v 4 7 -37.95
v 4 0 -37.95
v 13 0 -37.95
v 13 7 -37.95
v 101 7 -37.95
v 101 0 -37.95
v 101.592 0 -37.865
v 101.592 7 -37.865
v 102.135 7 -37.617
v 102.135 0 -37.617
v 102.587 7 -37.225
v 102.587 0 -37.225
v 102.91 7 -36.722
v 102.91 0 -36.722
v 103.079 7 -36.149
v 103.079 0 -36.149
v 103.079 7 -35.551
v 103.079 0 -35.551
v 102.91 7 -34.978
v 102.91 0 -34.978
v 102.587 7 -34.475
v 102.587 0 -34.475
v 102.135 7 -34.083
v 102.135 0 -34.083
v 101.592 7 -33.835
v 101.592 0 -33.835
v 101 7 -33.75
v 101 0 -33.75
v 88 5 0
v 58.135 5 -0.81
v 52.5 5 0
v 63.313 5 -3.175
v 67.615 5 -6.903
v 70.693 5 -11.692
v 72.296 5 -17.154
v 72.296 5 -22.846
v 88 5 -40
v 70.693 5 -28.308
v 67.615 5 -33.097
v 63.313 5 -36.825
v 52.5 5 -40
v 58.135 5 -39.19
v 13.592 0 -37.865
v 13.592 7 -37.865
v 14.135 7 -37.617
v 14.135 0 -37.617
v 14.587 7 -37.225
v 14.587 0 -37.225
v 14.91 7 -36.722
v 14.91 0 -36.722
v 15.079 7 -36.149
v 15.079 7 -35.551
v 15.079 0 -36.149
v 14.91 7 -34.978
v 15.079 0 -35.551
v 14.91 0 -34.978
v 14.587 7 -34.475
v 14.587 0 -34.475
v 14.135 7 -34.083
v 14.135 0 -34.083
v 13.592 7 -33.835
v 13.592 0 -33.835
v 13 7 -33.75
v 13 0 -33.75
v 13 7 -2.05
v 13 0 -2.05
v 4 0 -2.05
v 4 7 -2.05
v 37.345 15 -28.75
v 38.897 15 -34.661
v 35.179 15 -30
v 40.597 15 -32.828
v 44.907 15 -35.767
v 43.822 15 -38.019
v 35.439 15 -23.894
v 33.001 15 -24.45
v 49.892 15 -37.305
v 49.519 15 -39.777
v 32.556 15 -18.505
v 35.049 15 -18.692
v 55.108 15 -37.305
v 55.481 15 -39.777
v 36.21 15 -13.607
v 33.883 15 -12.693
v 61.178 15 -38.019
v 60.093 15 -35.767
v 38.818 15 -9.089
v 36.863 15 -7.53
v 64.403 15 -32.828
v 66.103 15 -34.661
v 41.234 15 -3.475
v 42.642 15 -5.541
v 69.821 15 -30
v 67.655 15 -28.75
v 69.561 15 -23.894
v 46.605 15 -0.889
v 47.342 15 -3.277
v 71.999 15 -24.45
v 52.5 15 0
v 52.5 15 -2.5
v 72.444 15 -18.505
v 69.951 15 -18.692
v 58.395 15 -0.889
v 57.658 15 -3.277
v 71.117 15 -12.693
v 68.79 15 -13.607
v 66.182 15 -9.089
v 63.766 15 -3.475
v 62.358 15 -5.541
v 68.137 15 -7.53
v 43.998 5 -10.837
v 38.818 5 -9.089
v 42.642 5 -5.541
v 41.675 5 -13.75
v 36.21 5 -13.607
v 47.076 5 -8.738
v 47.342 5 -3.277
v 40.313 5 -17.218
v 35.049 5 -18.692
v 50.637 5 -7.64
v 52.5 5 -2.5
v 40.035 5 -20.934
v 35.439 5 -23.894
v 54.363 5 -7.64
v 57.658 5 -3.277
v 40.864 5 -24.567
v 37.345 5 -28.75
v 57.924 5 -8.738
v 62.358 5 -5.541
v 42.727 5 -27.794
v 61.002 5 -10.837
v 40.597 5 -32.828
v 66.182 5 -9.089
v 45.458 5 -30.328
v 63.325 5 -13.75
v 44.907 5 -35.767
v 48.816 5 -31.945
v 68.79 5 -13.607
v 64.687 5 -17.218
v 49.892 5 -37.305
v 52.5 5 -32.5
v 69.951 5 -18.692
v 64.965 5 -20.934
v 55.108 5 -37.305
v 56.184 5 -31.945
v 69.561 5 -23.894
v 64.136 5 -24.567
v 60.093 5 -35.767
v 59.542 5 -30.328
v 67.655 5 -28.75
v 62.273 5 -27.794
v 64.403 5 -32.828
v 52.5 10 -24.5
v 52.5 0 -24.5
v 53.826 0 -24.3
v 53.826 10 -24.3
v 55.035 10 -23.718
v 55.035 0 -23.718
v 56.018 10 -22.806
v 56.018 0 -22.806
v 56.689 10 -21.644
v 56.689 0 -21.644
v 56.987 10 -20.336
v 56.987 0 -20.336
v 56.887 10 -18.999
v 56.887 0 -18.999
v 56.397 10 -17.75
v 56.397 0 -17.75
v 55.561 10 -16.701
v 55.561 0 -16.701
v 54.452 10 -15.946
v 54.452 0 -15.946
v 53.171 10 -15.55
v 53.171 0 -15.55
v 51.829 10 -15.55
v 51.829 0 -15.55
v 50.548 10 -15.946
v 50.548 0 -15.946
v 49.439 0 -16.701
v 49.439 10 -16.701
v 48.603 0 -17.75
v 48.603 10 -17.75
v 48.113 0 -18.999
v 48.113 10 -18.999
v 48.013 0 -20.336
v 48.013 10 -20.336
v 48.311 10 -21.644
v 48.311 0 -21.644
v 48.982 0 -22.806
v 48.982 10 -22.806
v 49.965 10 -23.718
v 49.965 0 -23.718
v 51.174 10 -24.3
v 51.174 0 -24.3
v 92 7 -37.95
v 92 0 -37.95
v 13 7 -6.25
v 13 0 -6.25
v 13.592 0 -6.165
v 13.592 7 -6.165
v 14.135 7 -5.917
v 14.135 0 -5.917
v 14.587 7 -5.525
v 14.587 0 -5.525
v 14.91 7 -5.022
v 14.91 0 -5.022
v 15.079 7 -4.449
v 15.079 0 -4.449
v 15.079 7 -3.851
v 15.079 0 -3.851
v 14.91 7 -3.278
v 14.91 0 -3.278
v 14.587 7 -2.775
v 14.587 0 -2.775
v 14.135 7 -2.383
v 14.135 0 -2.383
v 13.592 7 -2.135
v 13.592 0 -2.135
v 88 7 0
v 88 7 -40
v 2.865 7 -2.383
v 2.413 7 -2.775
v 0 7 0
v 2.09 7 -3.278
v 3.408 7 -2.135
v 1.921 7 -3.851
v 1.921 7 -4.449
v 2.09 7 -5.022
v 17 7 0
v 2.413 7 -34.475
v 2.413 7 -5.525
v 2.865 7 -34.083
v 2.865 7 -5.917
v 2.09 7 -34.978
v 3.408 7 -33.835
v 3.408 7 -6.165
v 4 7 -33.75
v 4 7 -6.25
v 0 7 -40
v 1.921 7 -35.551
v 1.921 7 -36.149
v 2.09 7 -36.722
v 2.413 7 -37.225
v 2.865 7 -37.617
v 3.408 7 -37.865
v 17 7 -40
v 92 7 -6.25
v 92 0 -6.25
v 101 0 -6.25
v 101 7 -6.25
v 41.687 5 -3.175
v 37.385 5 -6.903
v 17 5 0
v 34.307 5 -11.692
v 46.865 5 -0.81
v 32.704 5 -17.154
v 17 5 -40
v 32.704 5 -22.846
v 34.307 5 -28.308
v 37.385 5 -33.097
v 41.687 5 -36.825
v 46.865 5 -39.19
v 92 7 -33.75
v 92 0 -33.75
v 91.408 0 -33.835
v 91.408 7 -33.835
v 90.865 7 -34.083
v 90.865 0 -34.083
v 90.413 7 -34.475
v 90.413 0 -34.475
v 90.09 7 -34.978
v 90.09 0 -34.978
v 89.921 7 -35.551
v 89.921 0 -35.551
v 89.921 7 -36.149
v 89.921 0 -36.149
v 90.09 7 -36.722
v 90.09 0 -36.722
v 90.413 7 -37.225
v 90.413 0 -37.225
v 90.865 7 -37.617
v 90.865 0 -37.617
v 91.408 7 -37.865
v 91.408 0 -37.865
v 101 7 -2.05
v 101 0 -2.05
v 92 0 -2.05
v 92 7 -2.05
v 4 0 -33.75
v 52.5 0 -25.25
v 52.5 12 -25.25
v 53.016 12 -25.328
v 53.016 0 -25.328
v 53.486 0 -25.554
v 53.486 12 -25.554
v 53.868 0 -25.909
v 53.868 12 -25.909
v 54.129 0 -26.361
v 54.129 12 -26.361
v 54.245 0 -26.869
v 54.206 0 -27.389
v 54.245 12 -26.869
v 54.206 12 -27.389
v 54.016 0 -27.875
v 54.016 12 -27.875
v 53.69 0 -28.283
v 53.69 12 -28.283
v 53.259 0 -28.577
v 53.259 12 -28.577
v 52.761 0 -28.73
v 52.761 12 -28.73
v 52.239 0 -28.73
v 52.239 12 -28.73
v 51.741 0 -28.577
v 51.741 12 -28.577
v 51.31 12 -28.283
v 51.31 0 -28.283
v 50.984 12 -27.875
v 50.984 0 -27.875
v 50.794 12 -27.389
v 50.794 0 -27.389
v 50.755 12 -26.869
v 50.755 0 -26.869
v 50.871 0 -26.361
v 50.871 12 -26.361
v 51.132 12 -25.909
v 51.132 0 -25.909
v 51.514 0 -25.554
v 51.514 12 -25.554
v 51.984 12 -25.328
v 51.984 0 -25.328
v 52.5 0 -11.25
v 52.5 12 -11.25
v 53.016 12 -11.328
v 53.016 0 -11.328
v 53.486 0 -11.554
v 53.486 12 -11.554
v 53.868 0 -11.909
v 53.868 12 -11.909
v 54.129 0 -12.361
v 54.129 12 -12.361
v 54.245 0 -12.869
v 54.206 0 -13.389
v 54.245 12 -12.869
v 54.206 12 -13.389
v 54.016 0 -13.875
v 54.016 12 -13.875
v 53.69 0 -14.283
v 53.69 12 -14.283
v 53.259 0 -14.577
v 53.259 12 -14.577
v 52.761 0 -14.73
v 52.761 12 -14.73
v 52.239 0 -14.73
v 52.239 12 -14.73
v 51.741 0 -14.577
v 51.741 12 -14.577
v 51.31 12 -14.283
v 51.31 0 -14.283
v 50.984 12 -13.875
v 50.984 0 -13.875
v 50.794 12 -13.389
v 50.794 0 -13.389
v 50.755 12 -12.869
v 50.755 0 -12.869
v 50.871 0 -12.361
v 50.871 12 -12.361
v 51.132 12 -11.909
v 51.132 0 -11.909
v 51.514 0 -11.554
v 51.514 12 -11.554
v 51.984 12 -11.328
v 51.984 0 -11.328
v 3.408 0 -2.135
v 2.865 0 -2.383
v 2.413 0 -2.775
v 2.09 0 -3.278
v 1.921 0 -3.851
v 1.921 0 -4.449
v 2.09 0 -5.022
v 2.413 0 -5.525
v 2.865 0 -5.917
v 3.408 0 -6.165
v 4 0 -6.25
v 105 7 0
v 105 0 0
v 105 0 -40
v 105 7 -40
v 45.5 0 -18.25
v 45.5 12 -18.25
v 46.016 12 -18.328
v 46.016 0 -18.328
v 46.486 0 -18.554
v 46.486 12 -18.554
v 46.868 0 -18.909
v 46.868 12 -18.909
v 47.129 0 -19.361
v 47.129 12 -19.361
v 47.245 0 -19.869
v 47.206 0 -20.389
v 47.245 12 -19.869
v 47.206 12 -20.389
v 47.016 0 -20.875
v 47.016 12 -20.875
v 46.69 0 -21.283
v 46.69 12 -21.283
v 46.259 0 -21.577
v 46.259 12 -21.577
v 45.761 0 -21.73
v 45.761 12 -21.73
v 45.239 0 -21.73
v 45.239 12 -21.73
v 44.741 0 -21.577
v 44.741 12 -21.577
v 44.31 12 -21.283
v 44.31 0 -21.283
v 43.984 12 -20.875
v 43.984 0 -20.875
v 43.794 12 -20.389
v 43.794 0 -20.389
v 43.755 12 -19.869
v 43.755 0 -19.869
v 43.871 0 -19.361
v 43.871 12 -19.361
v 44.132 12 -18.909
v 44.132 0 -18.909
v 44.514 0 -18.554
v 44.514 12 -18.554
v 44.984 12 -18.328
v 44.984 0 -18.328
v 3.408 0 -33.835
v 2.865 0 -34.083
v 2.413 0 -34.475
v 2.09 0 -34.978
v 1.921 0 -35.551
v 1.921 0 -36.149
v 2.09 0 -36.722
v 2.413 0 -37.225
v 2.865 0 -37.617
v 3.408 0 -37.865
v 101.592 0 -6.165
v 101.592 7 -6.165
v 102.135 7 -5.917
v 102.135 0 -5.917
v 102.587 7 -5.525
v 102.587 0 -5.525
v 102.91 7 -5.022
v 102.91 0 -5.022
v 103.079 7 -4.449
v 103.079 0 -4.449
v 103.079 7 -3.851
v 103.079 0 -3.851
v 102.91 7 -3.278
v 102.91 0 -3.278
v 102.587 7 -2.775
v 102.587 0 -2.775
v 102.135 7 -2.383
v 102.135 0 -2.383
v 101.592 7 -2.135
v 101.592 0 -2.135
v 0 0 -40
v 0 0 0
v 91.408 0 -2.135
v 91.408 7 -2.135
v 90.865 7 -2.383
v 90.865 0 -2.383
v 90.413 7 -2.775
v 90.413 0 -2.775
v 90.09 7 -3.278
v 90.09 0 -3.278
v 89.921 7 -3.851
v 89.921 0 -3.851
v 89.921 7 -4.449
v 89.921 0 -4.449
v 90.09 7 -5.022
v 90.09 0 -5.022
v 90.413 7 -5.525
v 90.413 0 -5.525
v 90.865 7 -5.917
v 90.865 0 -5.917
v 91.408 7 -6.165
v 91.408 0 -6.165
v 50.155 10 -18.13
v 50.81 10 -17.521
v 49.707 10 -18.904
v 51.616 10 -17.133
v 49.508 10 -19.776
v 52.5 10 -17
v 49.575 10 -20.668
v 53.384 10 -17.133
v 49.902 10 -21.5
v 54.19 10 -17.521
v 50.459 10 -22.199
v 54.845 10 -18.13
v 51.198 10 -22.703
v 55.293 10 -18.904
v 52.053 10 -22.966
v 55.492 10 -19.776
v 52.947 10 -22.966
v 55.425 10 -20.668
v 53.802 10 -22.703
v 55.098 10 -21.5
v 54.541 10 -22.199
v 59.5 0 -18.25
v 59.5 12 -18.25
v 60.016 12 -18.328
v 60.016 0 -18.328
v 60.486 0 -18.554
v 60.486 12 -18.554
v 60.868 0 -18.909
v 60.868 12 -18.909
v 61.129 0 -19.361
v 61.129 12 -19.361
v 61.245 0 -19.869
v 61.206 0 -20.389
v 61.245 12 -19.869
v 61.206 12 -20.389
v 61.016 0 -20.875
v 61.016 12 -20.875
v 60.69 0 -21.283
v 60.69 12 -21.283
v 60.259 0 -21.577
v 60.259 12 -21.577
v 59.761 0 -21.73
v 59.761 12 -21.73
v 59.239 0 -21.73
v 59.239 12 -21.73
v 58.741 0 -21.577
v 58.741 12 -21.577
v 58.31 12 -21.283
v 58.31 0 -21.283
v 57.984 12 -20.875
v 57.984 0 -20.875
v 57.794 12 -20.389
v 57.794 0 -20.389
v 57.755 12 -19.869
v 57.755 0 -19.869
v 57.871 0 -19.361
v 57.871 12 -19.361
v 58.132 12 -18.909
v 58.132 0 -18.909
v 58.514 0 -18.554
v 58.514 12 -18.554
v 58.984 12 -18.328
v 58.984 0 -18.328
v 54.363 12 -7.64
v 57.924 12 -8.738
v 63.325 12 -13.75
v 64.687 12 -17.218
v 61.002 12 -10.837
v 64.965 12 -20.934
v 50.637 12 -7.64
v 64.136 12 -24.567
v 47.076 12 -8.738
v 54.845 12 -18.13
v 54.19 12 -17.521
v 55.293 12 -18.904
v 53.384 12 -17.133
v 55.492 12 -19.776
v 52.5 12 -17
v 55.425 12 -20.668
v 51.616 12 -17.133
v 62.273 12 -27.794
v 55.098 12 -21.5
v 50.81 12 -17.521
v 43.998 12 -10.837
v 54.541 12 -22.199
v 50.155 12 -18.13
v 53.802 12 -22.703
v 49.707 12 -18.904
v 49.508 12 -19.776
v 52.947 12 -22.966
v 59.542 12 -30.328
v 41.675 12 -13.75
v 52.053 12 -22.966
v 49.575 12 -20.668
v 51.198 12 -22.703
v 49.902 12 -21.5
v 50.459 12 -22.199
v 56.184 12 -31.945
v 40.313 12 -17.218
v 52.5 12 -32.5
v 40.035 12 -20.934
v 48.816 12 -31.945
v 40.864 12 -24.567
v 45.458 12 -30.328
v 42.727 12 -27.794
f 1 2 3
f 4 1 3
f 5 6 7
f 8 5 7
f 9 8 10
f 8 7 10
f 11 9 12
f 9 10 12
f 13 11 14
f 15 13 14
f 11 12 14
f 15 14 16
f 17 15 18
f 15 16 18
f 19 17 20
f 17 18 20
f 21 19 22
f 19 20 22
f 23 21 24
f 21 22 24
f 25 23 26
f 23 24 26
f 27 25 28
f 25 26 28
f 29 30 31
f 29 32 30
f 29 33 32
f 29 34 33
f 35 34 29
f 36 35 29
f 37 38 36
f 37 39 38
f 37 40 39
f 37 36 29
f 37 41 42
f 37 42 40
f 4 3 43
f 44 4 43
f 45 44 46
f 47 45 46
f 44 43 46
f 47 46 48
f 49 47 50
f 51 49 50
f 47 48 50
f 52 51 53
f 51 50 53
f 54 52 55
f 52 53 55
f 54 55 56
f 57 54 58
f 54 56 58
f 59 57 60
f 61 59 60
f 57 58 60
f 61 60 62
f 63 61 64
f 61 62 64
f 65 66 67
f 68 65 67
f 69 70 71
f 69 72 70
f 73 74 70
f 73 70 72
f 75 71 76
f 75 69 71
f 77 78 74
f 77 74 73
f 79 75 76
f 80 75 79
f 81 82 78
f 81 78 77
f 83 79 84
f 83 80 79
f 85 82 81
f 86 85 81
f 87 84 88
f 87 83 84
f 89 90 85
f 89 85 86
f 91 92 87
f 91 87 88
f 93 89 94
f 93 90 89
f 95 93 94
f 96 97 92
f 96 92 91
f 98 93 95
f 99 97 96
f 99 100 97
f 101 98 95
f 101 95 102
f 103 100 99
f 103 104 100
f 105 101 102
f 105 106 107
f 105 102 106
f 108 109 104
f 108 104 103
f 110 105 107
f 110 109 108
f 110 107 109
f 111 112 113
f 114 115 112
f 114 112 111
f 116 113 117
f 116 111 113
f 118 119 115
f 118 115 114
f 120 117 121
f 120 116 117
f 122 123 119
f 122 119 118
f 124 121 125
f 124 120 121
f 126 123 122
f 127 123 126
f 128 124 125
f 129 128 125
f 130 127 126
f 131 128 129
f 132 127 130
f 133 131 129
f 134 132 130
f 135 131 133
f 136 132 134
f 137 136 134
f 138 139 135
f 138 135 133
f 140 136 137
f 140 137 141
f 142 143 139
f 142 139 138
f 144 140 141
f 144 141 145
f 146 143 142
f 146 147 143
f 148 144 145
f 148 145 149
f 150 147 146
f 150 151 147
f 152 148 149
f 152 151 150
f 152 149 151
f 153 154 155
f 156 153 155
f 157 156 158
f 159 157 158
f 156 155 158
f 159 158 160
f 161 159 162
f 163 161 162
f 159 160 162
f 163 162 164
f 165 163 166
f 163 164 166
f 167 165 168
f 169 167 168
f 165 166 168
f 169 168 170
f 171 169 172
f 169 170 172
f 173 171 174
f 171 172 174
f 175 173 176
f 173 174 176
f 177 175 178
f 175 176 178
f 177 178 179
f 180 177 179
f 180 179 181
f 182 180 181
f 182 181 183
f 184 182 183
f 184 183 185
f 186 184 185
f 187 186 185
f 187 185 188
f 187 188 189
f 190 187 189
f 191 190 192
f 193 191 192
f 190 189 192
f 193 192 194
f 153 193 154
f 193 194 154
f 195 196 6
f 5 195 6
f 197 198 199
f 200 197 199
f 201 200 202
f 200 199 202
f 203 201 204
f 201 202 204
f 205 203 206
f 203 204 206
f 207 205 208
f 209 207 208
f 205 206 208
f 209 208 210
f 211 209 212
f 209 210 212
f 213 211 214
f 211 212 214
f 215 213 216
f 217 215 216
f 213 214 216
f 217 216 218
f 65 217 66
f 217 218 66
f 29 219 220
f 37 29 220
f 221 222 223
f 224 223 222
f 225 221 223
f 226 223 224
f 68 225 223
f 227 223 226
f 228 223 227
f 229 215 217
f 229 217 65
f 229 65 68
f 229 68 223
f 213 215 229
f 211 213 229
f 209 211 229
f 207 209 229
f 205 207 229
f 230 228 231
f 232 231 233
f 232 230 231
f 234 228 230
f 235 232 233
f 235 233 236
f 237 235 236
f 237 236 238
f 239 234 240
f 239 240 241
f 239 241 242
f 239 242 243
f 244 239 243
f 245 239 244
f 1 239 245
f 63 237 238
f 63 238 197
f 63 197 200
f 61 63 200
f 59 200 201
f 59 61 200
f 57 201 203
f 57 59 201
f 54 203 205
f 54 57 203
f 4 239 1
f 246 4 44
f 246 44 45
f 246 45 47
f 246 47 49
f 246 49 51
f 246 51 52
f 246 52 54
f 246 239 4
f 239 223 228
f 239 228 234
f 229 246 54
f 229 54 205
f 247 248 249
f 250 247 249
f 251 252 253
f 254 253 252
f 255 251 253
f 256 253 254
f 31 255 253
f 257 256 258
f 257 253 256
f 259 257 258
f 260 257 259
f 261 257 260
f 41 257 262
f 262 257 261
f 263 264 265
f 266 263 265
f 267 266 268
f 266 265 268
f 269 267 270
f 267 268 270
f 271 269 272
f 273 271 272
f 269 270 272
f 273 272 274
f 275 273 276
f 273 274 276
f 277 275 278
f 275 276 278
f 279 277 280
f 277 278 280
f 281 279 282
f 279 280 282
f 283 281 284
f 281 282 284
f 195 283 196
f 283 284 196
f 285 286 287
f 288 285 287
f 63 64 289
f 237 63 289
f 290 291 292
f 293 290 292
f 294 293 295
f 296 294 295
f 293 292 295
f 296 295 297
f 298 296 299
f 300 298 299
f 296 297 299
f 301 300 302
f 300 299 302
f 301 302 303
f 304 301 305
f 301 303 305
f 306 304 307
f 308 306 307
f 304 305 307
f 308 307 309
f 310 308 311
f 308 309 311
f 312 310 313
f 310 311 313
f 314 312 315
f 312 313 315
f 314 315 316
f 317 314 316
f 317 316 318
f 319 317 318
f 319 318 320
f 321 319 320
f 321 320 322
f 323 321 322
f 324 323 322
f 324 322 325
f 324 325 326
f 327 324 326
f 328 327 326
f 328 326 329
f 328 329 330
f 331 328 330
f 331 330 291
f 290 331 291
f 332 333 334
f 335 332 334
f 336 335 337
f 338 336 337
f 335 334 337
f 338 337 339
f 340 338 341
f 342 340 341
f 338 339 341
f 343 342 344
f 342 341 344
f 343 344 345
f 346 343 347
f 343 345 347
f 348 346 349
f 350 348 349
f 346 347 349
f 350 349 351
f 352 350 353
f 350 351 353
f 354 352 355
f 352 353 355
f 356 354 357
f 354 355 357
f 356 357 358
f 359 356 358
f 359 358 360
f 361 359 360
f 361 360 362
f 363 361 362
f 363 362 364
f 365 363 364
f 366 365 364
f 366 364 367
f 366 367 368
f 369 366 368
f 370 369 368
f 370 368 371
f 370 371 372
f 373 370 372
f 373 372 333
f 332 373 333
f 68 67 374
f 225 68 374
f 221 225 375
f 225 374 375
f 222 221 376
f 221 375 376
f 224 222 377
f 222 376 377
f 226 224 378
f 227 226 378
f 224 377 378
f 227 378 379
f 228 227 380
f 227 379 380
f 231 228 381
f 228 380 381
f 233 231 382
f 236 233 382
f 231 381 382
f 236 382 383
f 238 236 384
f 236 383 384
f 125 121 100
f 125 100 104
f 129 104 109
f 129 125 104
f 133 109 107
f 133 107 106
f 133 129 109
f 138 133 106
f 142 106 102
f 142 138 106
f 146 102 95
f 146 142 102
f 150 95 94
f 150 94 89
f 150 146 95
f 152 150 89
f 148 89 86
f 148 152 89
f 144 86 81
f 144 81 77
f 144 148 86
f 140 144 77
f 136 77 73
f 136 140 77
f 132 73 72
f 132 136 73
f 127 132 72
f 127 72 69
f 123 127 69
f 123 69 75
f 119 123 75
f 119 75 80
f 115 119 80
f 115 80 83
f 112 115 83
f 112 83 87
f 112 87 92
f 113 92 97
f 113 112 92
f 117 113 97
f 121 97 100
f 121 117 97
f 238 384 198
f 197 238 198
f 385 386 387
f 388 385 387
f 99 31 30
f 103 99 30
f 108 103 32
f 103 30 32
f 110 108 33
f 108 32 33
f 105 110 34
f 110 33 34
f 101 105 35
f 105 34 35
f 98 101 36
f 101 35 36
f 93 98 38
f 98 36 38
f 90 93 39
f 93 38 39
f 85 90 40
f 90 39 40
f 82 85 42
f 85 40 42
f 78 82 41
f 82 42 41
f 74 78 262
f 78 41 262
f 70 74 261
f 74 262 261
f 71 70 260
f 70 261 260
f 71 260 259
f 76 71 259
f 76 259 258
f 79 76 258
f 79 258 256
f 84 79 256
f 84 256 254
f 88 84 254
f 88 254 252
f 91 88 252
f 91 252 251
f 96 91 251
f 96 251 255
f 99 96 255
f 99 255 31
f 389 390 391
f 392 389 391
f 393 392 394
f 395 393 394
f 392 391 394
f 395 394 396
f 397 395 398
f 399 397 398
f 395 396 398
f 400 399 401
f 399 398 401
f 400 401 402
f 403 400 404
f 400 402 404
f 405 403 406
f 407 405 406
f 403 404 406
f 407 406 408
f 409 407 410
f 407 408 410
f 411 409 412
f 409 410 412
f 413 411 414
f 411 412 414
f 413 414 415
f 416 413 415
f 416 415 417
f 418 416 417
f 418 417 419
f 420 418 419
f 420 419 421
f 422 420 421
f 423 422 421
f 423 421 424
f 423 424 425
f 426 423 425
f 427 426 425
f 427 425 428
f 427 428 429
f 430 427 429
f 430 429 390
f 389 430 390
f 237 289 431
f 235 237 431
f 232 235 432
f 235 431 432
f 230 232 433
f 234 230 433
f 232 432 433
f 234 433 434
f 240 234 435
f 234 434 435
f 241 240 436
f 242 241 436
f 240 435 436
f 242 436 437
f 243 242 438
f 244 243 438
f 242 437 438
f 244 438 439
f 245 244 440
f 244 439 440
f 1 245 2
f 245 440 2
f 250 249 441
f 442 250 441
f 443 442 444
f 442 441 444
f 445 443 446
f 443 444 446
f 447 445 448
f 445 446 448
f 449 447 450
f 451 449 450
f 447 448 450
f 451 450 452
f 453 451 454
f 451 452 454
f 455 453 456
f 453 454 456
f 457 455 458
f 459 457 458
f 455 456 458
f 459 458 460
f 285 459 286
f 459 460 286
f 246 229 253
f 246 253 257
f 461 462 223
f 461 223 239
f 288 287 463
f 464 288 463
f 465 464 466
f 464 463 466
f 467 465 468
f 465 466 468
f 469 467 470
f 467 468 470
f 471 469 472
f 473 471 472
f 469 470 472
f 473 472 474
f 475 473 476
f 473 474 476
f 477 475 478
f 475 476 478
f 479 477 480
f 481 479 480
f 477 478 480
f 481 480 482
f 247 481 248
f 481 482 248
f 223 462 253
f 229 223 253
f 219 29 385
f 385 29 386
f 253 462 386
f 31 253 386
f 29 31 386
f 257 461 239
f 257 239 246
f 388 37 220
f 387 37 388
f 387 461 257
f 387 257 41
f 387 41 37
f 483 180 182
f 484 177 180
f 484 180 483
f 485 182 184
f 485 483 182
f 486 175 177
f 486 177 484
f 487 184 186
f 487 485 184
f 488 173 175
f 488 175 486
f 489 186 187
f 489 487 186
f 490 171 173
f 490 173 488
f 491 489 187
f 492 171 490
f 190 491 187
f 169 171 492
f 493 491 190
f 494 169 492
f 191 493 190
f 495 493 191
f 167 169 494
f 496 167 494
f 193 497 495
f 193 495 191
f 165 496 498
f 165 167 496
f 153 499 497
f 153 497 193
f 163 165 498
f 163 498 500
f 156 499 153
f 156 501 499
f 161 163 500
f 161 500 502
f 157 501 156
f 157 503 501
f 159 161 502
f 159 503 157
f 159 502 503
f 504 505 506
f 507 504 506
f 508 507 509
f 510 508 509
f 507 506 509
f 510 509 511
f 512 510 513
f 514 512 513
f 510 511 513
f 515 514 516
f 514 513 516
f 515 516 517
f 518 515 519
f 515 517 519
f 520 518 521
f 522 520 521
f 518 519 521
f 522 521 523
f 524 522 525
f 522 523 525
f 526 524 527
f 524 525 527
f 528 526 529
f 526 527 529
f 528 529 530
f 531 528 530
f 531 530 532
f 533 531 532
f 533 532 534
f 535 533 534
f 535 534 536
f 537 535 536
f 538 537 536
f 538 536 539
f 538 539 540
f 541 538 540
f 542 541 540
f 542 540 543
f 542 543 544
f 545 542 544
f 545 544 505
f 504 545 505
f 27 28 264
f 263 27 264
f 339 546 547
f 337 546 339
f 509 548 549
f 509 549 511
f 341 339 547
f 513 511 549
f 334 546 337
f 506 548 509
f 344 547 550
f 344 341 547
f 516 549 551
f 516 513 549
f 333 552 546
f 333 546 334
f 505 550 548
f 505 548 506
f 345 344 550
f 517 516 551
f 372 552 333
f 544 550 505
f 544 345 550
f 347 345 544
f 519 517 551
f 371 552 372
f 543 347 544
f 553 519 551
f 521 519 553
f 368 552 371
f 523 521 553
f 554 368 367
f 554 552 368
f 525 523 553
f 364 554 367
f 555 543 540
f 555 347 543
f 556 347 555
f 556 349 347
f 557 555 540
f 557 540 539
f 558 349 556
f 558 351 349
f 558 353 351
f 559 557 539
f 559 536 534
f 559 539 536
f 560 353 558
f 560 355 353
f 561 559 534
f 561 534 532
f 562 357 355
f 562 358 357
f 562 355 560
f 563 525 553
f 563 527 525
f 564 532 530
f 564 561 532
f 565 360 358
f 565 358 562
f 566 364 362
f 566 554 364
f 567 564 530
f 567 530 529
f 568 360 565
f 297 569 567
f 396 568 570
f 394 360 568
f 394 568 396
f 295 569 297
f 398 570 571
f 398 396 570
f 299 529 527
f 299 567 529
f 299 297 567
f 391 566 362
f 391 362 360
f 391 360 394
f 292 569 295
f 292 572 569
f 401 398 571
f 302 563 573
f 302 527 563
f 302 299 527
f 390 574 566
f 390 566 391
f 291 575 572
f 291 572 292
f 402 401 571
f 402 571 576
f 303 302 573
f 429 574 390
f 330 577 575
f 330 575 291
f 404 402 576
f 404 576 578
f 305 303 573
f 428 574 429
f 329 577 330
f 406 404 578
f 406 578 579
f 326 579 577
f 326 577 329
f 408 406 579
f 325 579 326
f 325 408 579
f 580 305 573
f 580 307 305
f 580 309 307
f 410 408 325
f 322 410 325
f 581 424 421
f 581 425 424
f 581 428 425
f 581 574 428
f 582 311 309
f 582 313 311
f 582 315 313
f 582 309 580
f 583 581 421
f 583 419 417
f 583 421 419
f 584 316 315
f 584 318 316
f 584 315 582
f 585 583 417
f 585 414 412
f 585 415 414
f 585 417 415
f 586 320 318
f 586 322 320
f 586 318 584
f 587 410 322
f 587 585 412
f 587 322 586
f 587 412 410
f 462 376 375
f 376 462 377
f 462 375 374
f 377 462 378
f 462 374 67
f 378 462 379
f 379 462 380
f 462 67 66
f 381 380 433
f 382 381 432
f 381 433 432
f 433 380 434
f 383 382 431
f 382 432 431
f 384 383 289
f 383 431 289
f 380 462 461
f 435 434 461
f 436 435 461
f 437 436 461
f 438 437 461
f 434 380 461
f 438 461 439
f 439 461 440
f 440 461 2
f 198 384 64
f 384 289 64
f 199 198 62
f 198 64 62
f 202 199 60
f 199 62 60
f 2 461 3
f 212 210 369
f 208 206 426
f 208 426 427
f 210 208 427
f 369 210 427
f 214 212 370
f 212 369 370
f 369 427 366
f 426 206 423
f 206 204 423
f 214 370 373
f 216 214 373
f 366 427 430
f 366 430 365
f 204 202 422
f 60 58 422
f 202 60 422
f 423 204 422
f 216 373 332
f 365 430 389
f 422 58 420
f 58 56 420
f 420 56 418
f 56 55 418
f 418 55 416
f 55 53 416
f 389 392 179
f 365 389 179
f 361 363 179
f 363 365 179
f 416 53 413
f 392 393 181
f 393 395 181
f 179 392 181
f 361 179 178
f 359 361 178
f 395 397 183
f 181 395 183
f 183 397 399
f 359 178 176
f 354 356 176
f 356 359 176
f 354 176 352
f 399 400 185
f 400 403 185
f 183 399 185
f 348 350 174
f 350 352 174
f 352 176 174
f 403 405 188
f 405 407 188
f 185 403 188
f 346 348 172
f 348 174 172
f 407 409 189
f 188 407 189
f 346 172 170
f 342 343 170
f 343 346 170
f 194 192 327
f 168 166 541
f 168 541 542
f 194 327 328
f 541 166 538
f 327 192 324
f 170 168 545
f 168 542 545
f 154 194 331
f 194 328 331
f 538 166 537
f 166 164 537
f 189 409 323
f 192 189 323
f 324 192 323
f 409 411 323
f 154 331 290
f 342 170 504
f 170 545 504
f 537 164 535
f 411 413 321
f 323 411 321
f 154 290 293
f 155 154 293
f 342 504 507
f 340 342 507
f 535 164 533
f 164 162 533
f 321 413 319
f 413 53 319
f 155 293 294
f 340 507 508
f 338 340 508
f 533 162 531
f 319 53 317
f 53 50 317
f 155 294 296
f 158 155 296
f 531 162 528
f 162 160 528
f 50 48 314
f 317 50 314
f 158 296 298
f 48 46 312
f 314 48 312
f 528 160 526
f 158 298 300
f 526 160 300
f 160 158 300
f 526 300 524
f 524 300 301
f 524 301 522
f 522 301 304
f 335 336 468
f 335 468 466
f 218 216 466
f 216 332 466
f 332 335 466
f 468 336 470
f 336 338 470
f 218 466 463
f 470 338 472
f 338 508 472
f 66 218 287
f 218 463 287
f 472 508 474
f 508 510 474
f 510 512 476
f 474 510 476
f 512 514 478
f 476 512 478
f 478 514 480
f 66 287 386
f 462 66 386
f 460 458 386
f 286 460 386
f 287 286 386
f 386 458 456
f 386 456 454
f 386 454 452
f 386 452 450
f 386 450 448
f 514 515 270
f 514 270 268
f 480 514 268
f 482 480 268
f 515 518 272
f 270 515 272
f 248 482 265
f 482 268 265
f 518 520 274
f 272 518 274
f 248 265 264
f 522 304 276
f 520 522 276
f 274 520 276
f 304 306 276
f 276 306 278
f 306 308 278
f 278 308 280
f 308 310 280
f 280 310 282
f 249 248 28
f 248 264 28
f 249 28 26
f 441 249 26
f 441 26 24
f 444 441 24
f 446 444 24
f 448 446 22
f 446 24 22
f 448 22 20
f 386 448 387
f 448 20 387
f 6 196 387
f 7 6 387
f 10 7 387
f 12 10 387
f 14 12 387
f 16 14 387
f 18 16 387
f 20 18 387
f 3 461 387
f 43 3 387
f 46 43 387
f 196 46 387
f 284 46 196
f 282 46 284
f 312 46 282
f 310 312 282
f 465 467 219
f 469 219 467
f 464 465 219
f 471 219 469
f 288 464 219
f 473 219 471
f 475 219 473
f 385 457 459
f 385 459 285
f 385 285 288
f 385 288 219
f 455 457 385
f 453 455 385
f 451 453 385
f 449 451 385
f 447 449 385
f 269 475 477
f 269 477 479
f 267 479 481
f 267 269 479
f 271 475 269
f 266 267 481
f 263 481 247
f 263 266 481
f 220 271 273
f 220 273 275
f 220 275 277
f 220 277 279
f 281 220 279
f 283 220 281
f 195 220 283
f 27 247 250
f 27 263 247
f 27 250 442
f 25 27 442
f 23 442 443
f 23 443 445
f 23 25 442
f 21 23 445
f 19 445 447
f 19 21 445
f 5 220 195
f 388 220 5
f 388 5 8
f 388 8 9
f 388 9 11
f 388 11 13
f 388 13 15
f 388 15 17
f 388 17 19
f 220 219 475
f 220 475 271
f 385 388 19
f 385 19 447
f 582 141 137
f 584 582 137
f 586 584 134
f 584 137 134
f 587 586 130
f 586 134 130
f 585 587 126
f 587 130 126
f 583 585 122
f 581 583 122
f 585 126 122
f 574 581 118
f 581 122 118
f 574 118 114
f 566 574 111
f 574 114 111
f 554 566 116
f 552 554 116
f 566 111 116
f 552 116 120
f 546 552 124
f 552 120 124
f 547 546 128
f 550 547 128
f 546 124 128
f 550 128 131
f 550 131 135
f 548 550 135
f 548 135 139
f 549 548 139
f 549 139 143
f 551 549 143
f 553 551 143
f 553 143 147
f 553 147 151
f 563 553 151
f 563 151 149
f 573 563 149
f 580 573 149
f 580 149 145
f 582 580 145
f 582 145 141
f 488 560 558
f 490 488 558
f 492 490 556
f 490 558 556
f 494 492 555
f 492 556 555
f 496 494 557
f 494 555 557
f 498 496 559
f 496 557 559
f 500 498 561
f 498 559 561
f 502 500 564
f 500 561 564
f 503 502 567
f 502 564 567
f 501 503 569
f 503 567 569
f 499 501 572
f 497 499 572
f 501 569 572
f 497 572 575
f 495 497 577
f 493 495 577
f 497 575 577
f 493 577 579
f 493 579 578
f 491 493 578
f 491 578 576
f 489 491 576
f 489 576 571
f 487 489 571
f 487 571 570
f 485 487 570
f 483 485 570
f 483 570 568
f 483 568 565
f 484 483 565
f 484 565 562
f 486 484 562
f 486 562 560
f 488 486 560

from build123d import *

# Parameters (mm, degrees)
SKETCH1_W           = 105
SKETCH1_H           = 40
BOSS_EXTRUDE1_DEPTH = 7
SKETCH2_W           = 71
SKETCH2_H           = 40
CUT_EXTRUDE1_DEPTH  = 2
SKETCH4_R           = 20
SKETCH4_R_2         = 17.5
SKETCH4_R_3         = 12.5
BOSS_EXTRUDE3_DEPTH = 10
CUT_EXTRUDE2_START  = -3
SKETCH5_R           = 12.5
CUT_EXTRUDE2_DEPTH  = 3
SKETCH6_R           = 3
SKETCH6_R_2         = 1.75
CUT_EXTRUDE3_DEPTH  = 114
SKETCH7_R           = 4.5
CUT_EXTRUDE4_DEPTH  = 10


with BuildPart() as part:
    # Sketch1 → Boss-Extrude1 (new body)
    with BuildSketch(Plane(origin=(0, 0, 0), x_dir=(1, 0, 0), z_dir=(0, 1, 0))):
        with Locations((52.5, 20)):
            Rectangle(SKETCH1_W, SKETCH1_H)
        with BuildLine():
            Line((4, 37.95), (13, 37.95))
            ThreePointArc((13, 37.95), (15.1, 35.85), (13, 33.75))
            Line((13, 33.75), (4, 33.75))
            ThreePointArc((4, 33.75), (1.9, 35.85), (4, 37.95))
        make_face(mode=Mode.SUBTRACT)
        with BuildLine():
            Line((4, 6.25), (13, 6.25))
            ThreePointArc((13, 6.25), (15.1, 4.15), (13, 2.05))
            Line((13, 2.05), (4, 2.05))
            ThreePointArc((4, 2.05), (1.9, 4.15), (4, 6.25))
        make_face(mode=Mode.SUBTRACT)
        with BuildLine():
            Line((92, 37.95), (101, 37.95))
            ThreePointArc((101, 37.95), (103.1, 35.85), (101, 33.75))
            Line((101, 33.75), (92, 33.75))
            ThreePointArc((92, 33.75), (89.9, 35.85), (92, 37.95))
        make_face(mode=Mode.SUBTRACT)
        with BuildLine():
            Line((92, 6.25), (101, 6.25))
            ThreePointArc((101, 6.25), (103.1, 4.15), (101, 2.05))
            Line((101, 2.05), (92, 2.05))
            ThreePointArc((92, 2.05), (89.9, 4.15), (92, 6.25))
        make_face(mode=Mode.SUBTRACT)
    extrude(amount=BOSS_EXTRUDE1_DEPTH)

    # Sketch2 → Cut-Extrude1 (cut)
    with BuildSketch(Plane(origin=(0, 7, 0), x_dir=(1, 0, 0), z_dir=(0, 1, 0))):
        with Locations((52.5, 20)):
            Rectangle(SKETCH2_W, SKETCH2_H)
    extrude(amount=-CUT_EXTRUDE1_DEPTH, mode=Mode.SUBTRACT)

    # Sketch4 → Boss-Extrude3 (add)
    # profile 1 of 2: a face of its own
    with BuildSketch(Plane(origin=(0, 5, 0), x_dir=(1, 0, 0), z_dir=(0, 1, 0))):
        with Locations(Location((52.5, 20, 0), (0, 0, 270))):
            Circle(SKETCH4_R)
        with Locations(Location((52.5, 20, 0), (0, 0, 270))):
            Circle(SKETCH4_R_2, mode=Mode.SUBTRACT)
    # profile 2 of 2: a face of its own
    with BuildSketch(Plane(origin=(0, 5, 0), x_dir=(1, 0, 0), z_dir=(0, 1, 0))):
        with Locations(Location((52.5, 20, 0), (0, 0, 90))):
            Circle(SKETCH4_R_3)
    extrude(amount=BOSS_EXTRUDE3_DEPTH)

    # Sketch5 → Cut-Extrude2 (cut)
    with BuildSketch(Plane(origin=(0, 15, 0), x_dir=(1, 0, 0), z_dir=(0, 1, 0)).offset(CUT_EXTRUDE2_START)):
        with Locations(Location((52.5, 20, 0), (0, 0, 90))):
            Circle(SKETCH5_R)
    extrude(amount=CUT_EXTRUDE2_DEPTH, mode=Mode.SUBTRACT)

    # Sketch6 → Cut-Extrude3 (cut, through all)
    with BuildSketch(Plane(origin=(0, 12, 0), x_dir=(1, 0, 0), z_dir=(0, 1, 0))):
        with Locations(Location((52.5, 20, 0), (0, 0, 270))):
            Circle(SKETCH6_R)
        with Locations(Location((45.5, 20, 0), (0, 0, 270))):
            Circle(SKETCH6_R_2)
        with Locations(Location((52.5, 27, 0), (0, 0, 270))):
            Circle(SKETCH6_R_2)
        with Locations(Location((59.5, 20, 0), (0, 0, 270))):
            Circle(SKETCH6_R_2)
        with Locations(Location((52.5, 13, 0), (0, 0, 270))):
            Circle(SKETCH6_R_2)
    extrude(amount=-CUT_EXTRUDE3_DEPTH, mode=Mode.SUBTRACT)

    # Sketch7 → Cut-Extrude4 (cut)
    with BuildSketch(Plane.XZ):
        with Locations(Location((52.5, -20, 0), (0, 0, 270))):
            Circle(SKETCH7_R)
    extrude(amount=-CUT_EXTRUDE4_DEPTH, mode=Mode.SUBTRACT)


solid = part.part
